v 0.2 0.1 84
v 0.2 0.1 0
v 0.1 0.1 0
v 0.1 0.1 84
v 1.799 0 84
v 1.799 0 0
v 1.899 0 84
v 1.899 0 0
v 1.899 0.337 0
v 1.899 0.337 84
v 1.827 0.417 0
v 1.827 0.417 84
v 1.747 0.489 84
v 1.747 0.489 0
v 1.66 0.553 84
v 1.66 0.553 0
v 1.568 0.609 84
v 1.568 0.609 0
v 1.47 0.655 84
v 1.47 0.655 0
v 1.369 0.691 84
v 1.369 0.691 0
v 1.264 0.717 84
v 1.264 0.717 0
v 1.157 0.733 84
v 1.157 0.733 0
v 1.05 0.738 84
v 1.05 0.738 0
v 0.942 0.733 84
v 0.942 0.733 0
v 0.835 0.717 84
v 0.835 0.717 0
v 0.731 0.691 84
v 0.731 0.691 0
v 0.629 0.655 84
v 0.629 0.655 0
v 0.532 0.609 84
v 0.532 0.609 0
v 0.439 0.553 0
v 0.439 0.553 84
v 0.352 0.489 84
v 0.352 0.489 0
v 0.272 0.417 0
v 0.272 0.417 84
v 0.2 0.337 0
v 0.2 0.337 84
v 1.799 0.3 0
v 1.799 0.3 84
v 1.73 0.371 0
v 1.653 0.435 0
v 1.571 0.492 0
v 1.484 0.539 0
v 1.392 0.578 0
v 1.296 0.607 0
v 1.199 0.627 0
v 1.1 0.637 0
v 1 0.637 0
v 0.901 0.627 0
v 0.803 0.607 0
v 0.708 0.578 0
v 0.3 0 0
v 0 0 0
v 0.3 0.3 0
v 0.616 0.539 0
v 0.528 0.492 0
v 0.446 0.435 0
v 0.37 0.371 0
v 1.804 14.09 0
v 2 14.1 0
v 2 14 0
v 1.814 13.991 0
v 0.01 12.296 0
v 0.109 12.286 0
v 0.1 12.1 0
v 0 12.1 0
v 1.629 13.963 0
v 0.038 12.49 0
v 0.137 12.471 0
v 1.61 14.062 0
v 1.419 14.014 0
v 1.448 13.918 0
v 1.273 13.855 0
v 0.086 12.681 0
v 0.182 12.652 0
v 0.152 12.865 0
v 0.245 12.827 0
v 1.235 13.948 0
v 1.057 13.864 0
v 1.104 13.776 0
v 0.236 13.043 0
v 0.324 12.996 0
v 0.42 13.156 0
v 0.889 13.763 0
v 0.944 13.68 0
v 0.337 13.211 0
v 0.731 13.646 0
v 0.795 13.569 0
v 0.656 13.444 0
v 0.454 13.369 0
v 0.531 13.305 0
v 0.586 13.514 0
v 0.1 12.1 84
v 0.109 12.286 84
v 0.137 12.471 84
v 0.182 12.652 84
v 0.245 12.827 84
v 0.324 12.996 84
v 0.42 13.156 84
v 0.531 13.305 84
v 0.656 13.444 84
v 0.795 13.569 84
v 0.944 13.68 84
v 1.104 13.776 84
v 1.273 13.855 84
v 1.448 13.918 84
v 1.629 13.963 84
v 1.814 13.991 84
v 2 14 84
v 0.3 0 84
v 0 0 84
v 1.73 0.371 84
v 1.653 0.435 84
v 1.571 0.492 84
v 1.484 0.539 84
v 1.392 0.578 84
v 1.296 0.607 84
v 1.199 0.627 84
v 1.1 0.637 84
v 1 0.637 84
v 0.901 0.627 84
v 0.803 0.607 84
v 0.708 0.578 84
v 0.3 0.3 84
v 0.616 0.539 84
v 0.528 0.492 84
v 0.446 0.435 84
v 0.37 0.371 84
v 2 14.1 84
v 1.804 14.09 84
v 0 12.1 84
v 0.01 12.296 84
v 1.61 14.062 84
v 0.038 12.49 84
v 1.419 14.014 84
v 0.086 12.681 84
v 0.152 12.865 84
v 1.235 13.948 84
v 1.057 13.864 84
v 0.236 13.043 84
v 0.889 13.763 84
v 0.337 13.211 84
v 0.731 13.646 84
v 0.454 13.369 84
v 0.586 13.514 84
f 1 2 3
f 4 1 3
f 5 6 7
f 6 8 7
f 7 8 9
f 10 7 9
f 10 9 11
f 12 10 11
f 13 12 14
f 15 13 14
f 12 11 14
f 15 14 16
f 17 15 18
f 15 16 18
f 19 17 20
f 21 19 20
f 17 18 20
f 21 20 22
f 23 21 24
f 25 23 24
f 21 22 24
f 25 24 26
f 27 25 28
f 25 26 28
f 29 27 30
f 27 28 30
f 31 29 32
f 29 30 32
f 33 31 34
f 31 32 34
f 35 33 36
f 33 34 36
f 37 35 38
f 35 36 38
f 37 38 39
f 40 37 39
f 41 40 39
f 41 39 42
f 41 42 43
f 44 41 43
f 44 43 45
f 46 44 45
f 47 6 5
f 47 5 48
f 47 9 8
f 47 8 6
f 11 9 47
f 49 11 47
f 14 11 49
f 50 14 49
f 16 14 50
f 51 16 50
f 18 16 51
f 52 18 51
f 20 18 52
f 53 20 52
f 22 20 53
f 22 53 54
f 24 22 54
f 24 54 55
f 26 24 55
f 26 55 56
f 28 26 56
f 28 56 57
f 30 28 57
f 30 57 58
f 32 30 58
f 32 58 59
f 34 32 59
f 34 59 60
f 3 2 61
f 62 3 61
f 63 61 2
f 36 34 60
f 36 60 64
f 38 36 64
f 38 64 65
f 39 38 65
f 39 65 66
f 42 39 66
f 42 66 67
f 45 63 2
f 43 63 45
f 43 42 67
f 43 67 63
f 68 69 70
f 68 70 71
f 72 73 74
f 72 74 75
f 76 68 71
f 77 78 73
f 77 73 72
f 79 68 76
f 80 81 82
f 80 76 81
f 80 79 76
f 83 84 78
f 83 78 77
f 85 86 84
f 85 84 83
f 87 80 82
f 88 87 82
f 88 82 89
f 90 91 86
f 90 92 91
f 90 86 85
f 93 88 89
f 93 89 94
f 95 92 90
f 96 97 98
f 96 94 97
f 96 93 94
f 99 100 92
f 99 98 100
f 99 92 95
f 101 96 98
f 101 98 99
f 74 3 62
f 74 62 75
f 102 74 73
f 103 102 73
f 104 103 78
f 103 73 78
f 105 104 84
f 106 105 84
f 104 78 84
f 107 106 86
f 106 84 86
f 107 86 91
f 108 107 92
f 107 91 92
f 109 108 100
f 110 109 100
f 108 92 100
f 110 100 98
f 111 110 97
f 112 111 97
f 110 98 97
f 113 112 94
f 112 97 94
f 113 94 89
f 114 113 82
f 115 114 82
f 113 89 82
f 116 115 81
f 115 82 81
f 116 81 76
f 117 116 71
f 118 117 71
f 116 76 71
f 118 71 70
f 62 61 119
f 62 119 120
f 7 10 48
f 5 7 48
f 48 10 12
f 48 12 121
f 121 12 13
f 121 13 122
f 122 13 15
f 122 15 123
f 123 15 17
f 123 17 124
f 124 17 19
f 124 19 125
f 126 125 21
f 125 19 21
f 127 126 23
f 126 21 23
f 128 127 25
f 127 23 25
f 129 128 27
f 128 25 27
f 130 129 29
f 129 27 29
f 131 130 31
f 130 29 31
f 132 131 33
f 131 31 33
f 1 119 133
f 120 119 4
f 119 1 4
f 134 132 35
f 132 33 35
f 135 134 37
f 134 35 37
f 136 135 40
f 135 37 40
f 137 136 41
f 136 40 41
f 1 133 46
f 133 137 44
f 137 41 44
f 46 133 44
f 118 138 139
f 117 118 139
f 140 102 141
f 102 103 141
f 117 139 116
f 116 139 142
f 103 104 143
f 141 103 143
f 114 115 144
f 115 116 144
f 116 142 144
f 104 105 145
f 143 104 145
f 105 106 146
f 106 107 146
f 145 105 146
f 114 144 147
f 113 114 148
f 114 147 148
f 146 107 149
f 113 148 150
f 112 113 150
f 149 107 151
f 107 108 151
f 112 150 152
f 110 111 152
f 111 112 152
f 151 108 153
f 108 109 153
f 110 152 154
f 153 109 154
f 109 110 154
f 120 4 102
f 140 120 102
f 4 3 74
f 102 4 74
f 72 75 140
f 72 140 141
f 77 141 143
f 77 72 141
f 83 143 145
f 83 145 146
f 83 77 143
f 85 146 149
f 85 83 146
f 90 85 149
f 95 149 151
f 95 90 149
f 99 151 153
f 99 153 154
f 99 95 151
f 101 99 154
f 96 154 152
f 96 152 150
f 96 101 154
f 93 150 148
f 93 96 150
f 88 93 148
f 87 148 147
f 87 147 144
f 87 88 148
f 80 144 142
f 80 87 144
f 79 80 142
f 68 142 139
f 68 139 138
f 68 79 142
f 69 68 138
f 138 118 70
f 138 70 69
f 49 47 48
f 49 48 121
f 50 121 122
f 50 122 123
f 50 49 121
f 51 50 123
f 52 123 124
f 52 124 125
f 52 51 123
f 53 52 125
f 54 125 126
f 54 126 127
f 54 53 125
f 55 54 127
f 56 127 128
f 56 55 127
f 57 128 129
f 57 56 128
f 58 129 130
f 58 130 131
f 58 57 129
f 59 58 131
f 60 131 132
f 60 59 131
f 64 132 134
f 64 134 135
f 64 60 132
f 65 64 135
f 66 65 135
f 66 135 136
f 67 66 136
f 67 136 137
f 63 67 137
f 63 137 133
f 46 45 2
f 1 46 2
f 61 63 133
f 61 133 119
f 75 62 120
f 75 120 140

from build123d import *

# Parameters (mm, degrees)
SHEET_EXTRUDE_1_1_DEPTH = 84
THICKEN_1_T2            = 0.1


with BuildPart() as body_1:
    # Sheet Extrude 1: a surface, the sketch's curves swept straight by 84 mm
    with BuildLine(Plane.XY, mode=Mode.PRIVATE) as sheet_extrude_1_1_path:
        Line((1.799379952, 0), (1.799379952, 0.3))
        ThreePointArc((1.799379952, 0.3), (1.049689976, 0.638210804), (0.3, 0.3))
        Line((0.3, 0.3), (0.3, 0))
        Line((0.3, 0), (0, 0))
        Line((0, 0), (0, 12.1))
        ThreePointArc((0, 12.1), (0.585786438, 13.514213562), (2, 14.1))
    sheet_extrude_1_1 = Shell.extrude(sheet_extrude_1_1_path.wire(), (0 * SHEET_EXTRUDE_1_1_DEPTH, 0 * SHEET_EXTRUDE_1_1_DEPTH, 1 * SHEET_EXTRUDE_1_1_DEPTH))
    add(Solid.thicken(sheet_extrude_1_1, -THICKEN_1_T2))


solid = body_1.part
